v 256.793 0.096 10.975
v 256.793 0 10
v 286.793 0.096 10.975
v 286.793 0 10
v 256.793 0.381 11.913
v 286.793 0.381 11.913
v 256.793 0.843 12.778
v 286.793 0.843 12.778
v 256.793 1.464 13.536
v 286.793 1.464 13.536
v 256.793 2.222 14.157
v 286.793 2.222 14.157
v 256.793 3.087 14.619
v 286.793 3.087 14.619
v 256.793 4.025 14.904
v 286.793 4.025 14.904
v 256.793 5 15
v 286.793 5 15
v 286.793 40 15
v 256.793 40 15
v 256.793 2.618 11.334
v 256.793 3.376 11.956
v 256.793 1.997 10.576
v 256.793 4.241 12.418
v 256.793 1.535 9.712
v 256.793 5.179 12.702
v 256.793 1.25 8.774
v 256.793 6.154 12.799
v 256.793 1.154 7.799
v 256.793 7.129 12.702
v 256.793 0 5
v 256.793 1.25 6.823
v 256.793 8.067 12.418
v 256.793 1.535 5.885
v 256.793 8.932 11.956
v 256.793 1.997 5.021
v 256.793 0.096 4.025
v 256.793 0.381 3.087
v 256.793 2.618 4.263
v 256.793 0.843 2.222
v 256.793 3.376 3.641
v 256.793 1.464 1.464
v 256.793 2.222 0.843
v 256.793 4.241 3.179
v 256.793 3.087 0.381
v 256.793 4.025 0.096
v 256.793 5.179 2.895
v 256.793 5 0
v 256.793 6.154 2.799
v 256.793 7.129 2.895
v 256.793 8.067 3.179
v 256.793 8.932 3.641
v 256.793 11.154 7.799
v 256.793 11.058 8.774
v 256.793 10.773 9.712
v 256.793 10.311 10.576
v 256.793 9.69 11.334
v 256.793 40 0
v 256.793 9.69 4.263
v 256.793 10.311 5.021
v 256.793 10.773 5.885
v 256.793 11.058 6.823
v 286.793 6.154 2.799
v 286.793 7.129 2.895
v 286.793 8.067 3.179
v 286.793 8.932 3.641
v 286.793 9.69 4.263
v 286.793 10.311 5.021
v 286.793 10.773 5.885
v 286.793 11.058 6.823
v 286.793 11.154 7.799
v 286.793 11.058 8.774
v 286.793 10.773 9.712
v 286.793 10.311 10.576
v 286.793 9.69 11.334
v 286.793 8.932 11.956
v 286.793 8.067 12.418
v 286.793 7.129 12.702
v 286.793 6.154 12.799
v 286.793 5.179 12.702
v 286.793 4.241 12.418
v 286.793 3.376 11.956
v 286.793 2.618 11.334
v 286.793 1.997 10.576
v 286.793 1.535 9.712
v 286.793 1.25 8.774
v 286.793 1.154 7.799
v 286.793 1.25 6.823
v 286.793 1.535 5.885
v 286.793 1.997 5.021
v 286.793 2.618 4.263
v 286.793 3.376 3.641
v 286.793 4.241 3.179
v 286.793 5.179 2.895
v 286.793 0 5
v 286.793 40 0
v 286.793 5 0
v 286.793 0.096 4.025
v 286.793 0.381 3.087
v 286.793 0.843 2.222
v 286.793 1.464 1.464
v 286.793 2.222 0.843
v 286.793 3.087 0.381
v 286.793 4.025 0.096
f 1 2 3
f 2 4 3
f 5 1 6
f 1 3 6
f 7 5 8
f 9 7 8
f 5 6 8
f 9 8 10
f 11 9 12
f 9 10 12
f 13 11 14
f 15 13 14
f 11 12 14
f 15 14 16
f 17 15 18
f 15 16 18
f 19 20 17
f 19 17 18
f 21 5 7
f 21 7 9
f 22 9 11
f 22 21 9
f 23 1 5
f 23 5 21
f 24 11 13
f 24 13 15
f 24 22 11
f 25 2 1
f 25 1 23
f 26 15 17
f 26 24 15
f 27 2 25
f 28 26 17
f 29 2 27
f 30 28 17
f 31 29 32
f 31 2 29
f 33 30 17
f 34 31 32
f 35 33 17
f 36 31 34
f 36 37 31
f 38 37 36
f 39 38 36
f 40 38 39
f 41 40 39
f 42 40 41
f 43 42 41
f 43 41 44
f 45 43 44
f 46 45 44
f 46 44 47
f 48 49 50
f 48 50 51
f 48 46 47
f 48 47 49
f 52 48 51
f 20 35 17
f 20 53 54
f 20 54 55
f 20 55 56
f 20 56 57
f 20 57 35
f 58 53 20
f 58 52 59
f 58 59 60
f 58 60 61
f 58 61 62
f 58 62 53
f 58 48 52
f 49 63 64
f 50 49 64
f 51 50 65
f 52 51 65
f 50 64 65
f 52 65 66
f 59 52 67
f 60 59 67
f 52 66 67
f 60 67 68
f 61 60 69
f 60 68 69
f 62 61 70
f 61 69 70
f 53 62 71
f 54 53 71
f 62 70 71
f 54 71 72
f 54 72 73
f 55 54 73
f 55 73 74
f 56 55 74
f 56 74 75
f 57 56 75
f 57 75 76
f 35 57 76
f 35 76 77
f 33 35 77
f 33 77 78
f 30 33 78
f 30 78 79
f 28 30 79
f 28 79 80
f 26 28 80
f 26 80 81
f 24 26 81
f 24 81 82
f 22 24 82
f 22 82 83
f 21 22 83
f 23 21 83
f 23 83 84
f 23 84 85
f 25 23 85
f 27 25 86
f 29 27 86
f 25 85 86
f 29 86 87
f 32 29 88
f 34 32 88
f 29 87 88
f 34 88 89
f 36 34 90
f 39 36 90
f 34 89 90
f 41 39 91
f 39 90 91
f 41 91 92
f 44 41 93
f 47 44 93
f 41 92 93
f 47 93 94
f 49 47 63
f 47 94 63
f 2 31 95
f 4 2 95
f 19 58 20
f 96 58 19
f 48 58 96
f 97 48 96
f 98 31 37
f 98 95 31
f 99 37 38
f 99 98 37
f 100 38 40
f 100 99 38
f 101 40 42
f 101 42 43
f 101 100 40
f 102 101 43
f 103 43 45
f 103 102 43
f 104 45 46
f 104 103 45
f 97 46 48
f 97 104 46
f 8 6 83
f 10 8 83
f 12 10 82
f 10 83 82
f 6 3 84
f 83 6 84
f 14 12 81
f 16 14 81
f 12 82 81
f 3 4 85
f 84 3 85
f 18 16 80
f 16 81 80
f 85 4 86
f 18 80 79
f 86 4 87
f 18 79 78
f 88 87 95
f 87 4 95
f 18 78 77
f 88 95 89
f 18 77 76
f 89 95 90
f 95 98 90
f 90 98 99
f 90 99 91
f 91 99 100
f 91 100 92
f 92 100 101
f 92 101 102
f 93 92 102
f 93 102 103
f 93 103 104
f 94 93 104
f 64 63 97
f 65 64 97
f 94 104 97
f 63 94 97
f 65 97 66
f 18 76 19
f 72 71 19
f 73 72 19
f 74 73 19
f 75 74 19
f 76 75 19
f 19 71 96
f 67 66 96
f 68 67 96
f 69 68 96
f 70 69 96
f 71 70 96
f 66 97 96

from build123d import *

# Parameters (mm, degrees)
SKETCH1_W           = 30
SKETCH1_H           = 40
BOSS_EXTRUDE2_DEPTH = 15
FILLET4_R           = 5
FILLET5_R           = 5
SKETCH3_R           = 5
CUT_EXTRUDE2_DEPTH  = 53.201532545


with BuildPart() as part:
    # Sketch1 → Boss-Extrude2 (new body)
    with BuildSketch(Plane.XY):
        with Locations((271.793252061, 20)):
            Rectangle(SKETCH1_W, SKETCH1_H)
    extrude(amount=BOSS_EXTRUDE2_DEPTH)

    # Fillet4
    fillet4_edges = [part.edges().sort_by_distance(p)[0] for p in [
        (271.793252061, 0, 15),
    ]]
    fillet(fillet4_edges, radius=FILLET4_R)

    # Fillet5
    fillet5_edges = [part.edges().sort_by_distance(p)[0] for p in [
        (271.793252061, 0, 0),
    ]]
    fillet(fillet5_edges, radius=FILLET5_R)

    # Sketch3 → Cut-Extrude2 (cut, through all)
    with BuildSketch(Plane(origin=(286.793252061, 0, 0), x_dir=(0, 0, -1), z_dir=(1, 0, 0))):
        with Locations((-7.798550368, 6.154011522)):
            Circle(SKETCH3_R)
    extrude(amount=-CUT_EXTRUDE2_DEPTH, mode=Mode.SUBTRACT)


solid = part.part
